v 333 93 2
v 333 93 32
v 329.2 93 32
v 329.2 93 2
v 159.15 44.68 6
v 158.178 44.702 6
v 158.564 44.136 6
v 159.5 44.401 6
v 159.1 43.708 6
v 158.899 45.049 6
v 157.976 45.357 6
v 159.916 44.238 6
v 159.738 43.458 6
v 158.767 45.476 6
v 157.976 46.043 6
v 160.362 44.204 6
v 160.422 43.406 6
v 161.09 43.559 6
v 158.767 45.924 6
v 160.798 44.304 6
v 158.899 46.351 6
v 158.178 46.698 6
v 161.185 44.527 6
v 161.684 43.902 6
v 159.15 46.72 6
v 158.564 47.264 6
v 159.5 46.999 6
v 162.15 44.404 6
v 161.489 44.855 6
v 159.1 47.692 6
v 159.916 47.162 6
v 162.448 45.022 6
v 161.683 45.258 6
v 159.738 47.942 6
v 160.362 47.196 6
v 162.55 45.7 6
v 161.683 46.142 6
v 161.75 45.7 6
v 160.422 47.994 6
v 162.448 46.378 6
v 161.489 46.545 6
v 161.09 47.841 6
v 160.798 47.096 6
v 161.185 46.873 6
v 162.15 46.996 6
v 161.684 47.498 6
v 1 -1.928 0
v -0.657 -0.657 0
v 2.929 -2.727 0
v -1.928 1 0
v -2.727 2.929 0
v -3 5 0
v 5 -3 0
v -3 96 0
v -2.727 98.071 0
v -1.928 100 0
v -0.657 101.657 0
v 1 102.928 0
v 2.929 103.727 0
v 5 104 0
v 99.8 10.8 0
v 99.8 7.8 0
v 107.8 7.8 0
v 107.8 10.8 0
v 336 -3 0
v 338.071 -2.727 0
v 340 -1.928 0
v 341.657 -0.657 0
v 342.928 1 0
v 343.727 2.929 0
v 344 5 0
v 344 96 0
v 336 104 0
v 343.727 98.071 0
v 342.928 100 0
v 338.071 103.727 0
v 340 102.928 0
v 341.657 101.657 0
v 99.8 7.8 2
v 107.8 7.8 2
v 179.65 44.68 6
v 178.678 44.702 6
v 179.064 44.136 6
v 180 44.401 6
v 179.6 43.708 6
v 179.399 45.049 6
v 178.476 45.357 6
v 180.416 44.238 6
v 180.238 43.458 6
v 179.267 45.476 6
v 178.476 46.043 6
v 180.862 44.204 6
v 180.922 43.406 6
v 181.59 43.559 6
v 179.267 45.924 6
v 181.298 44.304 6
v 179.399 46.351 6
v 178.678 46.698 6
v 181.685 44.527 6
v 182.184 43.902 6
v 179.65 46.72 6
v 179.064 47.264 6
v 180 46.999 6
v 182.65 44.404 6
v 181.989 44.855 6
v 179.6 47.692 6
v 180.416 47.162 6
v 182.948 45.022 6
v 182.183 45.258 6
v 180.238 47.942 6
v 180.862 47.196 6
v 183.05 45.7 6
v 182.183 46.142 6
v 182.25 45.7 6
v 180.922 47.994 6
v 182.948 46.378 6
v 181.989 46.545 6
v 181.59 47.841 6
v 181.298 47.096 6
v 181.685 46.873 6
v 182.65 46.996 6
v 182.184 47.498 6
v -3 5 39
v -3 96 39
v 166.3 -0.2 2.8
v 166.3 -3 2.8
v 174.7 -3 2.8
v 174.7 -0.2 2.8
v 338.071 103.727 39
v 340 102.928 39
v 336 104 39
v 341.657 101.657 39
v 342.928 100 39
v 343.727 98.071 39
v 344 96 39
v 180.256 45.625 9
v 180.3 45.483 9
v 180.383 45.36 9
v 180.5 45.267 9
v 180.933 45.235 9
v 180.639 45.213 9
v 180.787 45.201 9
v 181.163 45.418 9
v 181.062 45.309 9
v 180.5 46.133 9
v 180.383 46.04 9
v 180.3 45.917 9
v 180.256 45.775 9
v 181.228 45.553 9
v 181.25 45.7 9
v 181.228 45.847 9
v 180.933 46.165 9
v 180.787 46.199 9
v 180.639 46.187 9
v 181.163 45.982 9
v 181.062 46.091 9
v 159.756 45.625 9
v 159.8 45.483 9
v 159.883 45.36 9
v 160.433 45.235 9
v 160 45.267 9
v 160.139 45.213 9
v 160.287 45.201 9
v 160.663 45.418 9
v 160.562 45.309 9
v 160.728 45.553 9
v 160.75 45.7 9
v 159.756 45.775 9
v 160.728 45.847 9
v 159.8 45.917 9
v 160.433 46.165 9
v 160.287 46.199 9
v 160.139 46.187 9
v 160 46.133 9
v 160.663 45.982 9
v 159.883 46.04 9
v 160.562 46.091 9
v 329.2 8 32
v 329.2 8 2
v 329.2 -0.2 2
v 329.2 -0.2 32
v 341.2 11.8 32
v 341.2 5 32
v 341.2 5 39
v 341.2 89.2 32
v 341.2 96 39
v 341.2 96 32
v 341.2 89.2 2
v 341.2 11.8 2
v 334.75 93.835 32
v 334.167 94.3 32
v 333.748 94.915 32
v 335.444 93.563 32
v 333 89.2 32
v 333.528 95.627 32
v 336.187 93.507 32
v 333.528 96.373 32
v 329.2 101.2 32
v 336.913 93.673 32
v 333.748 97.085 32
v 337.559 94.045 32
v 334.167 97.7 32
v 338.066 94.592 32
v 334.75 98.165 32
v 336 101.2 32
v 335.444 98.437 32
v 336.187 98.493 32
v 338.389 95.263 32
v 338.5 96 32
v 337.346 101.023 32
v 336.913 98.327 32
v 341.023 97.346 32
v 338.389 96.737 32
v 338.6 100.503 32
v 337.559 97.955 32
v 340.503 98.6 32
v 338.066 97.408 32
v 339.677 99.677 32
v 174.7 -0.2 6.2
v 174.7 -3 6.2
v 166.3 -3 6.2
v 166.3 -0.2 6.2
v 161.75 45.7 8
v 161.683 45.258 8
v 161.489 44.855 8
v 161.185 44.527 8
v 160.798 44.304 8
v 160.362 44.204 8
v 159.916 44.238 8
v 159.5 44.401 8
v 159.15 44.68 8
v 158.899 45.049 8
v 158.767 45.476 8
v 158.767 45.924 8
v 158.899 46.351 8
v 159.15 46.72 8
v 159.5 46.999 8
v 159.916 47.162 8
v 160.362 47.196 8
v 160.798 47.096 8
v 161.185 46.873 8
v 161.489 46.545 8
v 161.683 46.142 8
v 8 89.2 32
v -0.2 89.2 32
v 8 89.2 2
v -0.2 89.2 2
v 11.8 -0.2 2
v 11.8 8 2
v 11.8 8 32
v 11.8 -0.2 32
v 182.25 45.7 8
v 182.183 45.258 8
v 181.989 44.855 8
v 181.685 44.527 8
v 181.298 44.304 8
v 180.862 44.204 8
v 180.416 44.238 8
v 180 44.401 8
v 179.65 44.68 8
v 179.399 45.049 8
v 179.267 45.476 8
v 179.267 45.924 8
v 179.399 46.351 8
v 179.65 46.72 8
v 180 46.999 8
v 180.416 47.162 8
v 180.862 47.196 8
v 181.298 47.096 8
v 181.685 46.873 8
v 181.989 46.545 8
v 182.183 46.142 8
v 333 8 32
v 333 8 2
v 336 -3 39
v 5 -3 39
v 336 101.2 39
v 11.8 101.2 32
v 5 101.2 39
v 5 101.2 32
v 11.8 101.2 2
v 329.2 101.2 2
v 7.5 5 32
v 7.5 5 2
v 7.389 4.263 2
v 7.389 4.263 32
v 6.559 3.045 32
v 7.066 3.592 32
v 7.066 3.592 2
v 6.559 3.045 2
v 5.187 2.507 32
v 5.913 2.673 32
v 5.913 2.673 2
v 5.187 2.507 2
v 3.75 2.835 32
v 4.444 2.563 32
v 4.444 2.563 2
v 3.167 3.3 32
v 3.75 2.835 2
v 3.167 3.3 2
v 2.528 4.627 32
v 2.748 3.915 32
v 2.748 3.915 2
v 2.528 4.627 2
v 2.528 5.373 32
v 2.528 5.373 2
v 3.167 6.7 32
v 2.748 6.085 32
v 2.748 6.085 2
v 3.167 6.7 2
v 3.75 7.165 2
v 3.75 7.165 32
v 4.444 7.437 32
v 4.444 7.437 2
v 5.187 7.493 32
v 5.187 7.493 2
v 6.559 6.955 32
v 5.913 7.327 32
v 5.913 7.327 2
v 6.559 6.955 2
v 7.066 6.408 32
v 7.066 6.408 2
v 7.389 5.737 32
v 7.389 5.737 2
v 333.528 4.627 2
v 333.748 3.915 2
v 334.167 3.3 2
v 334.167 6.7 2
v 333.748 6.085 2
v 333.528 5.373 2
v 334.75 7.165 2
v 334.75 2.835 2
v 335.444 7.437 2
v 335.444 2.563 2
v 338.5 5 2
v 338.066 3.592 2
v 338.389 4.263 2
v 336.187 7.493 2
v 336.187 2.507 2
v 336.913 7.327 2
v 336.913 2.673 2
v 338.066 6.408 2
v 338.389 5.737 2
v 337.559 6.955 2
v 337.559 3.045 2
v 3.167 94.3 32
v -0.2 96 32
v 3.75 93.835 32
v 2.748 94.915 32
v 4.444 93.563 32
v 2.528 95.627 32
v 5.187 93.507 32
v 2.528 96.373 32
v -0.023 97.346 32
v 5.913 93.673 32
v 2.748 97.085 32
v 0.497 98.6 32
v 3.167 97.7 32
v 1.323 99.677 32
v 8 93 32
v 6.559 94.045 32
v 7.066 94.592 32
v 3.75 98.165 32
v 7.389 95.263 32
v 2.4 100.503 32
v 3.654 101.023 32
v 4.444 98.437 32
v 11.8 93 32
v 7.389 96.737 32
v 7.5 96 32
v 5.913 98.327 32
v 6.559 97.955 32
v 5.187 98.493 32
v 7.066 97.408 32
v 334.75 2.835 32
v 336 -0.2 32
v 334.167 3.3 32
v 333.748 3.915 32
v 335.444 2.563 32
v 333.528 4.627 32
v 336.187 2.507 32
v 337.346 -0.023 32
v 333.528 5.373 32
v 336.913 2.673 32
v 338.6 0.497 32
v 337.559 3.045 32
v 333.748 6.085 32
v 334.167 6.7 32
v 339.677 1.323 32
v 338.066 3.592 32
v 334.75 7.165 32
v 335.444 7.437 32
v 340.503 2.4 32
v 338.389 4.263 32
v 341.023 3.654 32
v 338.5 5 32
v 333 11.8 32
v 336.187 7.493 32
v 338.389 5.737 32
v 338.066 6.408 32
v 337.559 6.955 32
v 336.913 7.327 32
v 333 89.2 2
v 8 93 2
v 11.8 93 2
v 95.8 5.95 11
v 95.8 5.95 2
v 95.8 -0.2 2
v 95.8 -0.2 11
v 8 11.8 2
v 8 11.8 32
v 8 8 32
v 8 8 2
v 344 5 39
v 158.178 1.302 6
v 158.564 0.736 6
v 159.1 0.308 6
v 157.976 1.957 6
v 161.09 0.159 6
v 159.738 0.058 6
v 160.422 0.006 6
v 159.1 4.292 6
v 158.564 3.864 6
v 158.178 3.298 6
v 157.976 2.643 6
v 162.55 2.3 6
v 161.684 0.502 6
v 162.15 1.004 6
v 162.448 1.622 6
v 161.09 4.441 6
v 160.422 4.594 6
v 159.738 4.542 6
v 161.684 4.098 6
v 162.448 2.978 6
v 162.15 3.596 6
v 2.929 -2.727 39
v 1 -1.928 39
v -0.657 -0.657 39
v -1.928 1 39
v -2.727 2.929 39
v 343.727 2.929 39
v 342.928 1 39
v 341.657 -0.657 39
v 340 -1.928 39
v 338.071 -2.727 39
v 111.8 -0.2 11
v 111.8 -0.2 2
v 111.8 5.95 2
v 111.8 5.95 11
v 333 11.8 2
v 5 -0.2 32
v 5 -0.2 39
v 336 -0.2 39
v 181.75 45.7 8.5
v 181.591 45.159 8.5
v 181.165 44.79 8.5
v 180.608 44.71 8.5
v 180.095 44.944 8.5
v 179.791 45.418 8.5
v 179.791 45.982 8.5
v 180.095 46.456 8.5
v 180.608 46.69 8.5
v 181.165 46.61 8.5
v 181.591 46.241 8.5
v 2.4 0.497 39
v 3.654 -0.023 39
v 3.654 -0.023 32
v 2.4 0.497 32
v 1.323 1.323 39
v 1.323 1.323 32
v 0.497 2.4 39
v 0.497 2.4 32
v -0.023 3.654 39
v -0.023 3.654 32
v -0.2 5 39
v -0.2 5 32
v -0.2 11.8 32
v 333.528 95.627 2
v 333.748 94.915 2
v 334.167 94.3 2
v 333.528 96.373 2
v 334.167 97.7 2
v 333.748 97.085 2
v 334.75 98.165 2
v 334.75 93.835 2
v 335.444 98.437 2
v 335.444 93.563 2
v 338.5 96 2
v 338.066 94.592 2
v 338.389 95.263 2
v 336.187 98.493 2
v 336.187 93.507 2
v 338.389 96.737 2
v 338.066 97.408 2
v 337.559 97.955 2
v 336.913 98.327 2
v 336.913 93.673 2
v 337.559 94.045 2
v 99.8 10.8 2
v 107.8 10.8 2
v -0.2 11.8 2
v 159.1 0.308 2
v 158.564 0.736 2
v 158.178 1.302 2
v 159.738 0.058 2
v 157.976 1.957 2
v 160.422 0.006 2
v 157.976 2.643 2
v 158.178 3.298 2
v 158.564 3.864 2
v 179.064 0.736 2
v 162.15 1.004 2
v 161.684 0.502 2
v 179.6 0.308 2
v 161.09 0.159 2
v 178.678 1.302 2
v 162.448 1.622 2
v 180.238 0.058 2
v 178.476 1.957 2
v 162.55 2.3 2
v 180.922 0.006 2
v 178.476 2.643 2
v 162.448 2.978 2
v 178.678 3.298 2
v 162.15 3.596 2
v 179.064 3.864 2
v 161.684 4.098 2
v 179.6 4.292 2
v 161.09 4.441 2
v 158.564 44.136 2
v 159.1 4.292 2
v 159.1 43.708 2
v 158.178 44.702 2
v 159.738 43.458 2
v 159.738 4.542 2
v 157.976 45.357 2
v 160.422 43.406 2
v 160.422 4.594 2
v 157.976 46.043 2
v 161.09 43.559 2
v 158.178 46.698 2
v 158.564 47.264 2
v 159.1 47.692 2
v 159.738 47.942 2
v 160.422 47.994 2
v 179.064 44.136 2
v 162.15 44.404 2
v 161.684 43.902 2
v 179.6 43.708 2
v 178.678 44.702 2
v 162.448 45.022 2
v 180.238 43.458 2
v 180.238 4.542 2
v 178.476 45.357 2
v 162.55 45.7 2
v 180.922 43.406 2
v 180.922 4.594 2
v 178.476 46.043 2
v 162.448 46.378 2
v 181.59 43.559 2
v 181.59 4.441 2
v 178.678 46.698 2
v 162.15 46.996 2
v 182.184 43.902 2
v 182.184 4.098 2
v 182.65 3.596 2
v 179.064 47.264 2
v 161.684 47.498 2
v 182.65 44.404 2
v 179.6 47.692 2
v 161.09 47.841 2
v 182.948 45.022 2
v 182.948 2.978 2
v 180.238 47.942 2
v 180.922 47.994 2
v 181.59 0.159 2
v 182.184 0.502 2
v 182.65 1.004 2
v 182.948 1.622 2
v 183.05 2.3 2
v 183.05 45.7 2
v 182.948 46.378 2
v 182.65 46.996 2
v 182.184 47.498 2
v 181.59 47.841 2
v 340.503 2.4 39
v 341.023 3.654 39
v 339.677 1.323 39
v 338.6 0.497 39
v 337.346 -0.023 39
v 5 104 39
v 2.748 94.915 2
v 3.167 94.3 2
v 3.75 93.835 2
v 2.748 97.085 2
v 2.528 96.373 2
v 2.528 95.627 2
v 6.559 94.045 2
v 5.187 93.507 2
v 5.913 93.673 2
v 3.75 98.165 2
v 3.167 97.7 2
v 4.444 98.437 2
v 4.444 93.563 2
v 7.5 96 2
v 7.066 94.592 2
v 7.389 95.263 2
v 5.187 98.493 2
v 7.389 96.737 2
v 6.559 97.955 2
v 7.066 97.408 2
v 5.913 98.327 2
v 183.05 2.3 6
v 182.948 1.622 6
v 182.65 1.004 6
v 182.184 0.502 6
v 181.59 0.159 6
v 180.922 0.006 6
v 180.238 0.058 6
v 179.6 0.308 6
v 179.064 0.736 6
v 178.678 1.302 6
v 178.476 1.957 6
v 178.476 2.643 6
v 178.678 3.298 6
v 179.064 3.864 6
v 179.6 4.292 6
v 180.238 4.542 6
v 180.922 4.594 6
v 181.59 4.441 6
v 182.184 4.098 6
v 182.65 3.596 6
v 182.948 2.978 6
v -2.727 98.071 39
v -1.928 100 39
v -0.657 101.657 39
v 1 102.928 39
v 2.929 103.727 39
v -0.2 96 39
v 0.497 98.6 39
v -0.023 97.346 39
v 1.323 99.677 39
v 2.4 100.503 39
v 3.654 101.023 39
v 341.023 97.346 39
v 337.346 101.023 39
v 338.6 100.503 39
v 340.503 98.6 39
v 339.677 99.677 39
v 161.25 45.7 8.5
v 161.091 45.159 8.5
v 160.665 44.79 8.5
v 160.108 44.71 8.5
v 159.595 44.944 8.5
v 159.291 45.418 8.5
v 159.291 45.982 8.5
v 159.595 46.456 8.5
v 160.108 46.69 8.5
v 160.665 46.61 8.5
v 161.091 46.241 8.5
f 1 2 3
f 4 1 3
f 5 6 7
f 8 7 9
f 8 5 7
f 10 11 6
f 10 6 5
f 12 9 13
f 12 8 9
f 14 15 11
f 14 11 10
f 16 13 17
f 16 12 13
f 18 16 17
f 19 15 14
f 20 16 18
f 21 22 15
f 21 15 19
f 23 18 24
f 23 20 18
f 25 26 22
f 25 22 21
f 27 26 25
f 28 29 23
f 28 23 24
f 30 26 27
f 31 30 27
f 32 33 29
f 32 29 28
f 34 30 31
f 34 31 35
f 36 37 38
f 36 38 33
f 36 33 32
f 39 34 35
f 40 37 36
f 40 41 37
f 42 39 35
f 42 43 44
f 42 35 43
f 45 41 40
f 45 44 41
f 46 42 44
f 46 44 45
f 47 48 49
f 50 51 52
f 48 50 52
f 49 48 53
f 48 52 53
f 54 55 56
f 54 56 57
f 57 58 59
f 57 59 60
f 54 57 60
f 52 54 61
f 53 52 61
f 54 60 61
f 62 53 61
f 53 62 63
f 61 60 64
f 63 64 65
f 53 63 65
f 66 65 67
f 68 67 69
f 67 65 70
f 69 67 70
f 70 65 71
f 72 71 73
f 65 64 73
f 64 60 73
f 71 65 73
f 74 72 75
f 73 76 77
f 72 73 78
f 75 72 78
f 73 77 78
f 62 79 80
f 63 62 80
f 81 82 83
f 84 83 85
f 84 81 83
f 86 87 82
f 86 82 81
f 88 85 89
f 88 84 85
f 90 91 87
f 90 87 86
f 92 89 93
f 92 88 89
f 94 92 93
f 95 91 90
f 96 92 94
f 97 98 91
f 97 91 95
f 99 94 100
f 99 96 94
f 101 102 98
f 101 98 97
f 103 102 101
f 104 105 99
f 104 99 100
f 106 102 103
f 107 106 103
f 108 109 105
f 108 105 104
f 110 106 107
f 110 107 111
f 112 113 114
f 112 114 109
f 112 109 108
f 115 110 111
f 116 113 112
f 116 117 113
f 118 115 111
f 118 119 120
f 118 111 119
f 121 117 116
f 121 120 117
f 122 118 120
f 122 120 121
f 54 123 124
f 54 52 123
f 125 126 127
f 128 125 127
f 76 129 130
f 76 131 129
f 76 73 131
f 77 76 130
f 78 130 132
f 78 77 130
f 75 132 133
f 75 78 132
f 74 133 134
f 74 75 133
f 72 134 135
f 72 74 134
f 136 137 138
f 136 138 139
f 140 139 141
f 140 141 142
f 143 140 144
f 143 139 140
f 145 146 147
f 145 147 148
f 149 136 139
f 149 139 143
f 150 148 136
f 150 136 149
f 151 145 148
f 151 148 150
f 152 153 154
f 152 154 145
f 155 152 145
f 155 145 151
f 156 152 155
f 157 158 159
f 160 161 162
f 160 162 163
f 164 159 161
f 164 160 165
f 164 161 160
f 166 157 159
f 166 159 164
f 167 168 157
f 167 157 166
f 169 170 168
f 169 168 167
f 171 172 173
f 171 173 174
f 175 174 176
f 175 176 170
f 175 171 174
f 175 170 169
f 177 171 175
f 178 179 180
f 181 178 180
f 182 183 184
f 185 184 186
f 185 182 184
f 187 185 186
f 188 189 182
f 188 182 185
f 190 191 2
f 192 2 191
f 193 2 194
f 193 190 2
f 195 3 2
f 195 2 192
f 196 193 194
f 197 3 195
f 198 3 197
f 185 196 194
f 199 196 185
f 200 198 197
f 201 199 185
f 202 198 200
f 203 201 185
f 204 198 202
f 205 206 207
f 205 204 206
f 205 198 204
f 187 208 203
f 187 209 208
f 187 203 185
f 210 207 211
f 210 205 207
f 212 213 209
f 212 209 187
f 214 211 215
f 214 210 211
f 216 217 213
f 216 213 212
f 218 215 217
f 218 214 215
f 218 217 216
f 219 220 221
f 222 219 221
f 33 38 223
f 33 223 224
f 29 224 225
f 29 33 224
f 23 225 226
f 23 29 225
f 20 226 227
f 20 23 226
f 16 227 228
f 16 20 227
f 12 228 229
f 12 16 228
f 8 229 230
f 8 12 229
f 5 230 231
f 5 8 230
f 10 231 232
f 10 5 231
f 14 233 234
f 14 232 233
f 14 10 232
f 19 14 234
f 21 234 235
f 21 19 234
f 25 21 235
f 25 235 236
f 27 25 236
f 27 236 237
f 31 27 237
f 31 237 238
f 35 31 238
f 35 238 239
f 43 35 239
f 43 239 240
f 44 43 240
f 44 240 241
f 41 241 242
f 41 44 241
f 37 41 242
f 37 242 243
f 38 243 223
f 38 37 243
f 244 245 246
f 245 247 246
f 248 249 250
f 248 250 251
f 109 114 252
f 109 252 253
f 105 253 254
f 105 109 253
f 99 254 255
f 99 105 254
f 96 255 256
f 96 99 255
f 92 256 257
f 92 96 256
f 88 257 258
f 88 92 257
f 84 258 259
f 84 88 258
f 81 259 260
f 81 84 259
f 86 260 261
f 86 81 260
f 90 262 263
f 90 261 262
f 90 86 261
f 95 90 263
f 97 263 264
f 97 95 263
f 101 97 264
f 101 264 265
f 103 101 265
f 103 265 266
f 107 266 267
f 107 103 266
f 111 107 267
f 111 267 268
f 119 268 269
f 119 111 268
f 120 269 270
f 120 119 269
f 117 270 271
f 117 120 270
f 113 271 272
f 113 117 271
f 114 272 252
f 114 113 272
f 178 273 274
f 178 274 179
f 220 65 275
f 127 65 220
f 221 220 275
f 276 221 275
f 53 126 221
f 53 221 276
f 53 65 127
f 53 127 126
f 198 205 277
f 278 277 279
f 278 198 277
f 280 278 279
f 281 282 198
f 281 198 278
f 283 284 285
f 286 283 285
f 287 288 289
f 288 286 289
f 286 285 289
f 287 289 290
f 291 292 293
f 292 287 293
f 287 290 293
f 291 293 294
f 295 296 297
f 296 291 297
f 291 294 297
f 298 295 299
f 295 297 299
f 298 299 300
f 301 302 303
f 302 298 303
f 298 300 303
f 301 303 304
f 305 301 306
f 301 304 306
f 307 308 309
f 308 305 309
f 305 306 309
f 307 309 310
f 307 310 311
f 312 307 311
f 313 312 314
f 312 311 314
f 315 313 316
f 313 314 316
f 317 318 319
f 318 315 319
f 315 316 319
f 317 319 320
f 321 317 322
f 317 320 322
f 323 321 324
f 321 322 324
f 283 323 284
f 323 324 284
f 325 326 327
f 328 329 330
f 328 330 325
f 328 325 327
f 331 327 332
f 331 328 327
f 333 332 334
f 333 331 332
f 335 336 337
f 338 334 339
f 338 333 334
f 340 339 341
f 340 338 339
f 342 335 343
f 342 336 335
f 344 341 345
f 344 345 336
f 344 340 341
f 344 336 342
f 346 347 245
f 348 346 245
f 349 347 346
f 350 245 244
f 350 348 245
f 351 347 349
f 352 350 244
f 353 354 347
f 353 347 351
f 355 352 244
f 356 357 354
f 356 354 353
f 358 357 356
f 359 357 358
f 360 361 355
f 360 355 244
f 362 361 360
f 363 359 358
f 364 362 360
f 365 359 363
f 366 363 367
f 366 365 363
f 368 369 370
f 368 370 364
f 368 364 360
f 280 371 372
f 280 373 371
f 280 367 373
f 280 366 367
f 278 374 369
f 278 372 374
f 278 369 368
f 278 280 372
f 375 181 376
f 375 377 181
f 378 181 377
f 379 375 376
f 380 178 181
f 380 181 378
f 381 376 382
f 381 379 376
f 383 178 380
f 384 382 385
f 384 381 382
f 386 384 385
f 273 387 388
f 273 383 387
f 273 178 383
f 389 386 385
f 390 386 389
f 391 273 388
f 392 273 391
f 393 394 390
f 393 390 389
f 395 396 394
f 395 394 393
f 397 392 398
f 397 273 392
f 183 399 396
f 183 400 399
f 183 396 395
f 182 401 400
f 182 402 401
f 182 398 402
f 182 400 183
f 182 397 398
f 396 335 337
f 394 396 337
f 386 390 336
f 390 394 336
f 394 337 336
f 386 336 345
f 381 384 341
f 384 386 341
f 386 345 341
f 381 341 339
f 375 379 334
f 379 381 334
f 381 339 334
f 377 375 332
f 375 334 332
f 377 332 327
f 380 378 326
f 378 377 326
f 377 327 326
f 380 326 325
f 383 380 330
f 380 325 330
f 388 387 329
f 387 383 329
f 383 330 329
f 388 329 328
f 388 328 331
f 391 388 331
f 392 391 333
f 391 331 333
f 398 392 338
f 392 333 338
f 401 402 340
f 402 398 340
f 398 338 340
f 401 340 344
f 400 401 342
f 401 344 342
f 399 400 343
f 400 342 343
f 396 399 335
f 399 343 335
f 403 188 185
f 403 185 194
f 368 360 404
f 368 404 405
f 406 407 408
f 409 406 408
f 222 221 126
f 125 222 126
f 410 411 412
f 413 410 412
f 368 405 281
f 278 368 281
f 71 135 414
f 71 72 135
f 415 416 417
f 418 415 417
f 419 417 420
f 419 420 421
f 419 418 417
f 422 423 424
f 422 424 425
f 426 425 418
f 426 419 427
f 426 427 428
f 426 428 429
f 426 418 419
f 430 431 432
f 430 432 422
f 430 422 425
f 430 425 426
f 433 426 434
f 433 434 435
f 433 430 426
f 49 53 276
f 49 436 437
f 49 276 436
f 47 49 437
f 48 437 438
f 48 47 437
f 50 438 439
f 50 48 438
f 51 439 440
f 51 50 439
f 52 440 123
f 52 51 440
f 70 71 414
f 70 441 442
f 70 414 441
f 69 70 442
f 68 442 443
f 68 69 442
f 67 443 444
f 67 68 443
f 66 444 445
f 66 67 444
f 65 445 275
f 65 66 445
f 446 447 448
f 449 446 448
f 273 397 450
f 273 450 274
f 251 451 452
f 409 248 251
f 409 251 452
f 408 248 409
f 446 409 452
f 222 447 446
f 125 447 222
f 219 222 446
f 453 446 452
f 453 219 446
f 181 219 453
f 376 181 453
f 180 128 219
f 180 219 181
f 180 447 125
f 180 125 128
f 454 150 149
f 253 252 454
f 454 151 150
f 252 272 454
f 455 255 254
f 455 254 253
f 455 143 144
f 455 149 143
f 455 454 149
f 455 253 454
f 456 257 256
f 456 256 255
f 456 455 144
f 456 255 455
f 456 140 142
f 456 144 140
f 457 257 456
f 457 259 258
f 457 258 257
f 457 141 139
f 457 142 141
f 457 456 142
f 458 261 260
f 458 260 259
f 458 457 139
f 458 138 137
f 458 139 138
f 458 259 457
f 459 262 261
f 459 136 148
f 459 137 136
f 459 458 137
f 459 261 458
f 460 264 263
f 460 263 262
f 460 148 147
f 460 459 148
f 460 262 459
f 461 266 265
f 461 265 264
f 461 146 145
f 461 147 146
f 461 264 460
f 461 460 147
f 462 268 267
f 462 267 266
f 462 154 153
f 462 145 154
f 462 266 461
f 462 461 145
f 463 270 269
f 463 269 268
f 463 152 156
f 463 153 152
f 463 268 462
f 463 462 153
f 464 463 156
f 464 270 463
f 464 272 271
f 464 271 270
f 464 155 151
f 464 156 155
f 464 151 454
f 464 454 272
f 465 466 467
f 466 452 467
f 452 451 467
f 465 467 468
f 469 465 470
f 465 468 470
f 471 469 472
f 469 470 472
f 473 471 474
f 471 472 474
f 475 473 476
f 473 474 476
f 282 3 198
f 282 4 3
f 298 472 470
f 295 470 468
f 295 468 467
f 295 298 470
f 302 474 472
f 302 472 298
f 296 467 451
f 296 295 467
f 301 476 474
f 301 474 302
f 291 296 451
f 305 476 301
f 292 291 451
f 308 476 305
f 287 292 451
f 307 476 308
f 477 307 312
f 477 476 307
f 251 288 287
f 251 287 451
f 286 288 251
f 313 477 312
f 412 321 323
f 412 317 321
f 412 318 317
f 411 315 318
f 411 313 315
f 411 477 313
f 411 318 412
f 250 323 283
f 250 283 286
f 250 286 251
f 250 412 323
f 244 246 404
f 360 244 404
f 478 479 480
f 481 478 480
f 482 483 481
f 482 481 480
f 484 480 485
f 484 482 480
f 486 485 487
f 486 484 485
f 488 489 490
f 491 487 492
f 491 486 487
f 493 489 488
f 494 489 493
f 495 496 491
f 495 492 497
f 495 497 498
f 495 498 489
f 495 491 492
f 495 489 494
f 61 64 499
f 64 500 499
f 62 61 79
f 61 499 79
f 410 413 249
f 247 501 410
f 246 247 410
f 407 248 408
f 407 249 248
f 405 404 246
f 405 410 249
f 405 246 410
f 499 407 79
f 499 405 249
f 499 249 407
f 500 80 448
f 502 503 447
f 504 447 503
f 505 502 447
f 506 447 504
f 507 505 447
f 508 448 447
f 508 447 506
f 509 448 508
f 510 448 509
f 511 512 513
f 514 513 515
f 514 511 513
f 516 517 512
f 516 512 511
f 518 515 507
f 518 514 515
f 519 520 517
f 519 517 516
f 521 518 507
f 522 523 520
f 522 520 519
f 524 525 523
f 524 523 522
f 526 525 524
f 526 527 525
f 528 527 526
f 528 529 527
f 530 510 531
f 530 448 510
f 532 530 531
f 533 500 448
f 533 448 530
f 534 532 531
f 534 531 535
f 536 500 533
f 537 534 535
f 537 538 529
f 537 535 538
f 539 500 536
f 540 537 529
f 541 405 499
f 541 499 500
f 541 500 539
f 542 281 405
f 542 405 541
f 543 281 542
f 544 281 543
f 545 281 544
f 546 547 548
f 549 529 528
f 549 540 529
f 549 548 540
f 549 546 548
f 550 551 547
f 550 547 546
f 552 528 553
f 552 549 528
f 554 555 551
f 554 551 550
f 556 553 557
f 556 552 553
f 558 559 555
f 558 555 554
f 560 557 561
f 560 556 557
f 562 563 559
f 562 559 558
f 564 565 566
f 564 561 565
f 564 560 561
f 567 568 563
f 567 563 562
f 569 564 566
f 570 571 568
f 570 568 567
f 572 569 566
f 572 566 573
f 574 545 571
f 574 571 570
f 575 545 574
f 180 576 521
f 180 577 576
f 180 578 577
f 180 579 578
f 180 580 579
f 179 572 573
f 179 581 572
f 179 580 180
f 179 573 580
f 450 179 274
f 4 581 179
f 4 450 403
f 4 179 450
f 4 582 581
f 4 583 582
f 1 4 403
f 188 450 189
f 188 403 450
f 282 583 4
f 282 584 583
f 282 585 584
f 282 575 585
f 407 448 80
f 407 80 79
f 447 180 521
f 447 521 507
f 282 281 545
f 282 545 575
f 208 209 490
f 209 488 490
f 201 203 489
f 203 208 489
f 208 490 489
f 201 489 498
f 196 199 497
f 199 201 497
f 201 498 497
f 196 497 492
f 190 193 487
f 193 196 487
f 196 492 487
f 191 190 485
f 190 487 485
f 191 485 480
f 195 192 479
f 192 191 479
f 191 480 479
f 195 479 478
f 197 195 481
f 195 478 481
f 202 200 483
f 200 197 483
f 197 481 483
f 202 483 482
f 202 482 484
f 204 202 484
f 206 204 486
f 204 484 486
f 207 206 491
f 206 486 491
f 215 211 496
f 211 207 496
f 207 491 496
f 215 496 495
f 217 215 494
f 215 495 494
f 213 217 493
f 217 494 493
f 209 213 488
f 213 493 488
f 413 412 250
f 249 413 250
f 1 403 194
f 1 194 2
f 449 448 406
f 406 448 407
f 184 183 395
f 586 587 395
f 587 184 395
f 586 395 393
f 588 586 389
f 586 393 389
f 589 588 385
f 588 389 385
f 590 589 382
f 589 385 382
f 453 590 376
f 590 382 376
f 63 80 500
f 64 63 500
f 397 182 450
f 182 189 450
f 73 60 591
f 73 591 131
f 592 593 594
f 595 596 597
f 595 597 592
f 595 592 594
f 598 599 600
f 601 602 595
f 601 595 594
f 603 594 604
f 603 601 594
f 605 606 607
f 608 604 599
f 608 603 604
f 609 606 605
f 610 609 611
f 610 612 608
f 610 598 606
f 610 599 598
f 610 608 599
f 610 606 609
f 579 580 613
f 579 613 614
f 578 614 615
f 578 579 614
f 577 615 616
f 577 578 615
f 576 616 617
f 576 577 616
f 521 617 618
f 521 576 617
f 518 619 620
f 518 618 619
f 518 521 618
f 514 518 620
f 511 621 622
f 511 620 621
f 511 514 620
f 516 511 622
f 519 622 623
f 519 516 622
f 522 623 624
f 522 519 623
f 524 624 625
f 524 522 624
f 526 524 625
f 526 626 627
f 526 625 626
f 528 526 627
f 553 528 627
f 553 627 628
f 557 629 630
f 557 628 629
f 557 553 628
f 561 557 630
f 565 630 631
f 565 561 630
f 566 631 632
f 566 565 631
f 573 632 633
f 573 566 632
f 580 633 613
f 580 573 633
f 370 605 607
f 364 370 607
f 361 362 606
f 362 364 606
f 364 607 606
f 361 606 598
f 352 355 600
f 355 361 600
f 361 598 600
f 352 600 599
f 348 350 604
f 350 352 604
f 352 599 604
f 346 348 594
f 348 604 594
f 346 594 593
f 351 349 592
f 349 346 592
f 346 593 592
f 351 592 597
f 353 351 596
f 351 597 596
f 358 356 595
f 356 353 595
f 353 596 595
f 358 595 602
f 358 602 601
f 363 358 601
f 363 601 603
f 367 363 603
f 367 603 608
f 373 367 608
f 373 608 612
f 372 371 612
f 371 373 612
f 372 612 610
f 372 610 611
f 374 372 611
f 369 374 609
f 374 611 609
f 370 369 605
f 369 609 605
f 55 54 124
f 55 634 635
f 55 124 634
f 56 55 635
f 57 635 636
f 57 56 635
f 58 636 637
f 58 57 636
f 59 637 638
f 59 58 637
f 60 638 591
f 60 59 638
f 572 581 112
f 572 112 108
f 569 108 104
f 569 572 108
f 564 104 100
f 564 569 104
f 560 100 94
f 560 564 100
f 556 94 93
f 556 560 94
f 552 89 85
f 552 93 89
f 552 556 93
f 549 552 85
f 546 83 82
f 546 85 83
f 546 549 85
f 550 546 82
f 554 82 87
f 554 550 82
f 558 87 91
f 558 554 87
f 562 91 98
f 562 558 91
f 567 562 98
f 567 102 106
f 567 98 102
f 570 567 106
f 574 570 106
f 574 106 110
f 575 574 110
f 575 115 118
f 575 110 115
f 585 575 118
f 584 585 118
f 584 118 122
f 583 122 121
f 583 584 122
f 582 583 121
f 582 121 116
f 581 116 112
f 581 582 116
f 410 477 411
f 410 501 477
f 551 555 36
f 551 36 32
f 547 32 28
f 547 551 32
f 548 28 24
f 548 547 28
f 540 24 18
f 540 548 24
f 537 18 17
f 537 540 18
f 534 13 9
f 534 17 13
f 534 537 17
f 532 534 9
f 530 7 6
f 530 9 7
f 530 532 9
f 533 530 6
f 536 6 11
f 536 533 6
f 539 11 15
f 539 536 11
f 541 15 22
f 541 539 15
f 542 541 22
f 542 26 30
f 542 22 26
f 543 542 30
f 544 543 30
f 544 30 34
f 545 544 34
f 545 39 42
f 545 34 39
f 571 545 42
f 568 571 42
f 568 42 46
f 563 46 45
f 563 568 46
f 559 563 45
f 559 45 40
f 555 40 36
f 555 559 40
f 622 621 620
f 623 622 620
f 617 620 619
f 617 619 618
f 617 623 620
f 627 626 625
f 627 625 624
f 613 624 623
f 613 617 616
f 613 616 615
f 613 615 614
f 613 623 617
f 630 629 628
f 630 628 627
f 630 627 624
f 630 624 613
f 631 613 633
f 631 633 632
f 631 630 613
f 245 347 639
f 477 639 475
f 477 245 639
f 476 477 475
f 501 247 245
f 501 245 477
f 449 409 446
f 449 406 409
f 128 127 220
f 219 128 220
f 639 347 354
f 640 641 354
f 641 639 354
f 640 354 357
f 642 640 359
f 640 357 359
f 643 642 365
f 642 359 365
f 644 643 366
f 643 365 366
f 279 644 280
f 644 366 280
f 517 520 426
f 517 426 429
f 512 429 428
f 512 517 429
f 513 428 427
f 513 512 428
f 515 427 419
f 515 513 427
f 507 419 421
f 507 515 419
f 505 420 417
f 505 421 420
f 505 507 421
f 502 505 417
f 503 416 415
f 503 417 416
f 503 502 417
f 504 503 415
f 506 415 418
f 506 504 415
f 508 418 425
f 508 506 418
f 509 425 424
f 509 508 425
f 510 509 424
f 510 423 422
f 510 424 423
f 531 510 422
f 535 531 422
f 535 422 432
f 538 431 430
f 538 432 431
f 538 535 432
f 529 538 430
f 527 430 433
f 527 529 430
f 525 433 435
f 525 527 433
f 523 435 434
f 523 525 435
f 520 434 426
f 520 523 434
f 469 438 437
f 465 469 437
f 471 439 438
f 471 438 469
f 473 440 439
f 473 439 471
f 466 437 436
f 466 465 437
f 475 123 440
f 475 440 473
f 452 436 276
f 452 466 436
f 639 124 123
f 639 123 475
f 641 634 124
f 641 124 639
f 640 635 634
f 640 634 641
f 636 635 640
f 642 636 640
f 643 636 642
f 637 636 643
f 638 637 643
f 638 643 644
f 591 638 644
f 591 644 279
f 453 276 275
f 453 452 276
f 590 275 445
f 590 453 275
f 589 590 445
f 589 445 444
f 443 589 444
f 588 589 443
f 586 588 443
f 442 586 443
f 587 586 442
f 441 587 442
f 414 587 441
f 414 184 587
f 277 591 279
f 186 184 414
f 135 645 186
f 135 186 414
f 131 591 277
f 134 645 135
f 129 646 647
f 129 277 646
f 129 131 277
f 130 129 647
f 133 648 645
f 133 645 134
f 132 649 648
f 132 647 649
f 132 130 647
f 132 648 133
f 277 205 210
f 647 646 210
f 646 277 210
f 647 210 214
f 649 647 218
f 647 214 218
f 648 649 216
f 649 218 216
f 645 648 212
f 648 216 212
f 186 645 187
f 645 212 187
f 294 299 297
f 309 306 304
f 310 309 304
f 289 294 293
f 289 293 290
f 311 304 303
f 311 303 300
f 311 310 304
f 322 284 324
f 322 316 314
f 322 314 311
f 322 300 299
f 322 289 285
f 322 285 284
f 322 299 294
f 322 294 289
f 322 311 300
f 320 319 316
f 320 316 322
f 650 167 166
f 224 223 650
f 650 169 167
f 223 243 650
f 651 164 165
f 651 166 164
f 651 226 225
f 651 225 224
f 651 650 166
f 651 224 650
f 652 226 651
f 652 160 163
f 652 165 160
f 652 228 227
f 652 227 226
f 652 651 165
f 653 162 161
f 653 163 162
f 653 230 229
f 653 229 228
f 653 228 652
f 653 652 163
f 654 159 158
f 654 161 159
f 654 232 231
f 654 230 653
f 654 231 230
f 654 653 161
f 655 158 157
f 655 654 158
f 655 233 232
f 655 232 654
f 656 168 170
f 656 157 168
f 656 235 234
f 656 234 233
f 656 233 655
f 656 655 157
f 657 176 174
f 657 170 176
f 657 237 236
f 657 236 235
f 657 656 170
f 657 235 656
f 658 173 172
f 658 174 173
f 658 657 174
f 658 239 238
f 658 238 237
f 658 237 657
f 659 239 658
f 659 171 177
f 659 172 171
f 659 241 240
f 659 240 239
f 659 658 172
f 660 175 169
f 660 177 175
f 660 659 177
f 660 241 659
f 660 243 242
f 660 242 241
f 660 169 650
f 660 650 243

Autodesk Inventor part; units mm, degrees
ref_plane "YZ Plane" through (0, 0, 0) normal (1, 0, 0) x (0, 1, 0)
ref_plane "XZ Plane" through (0, 0, 0) normal (0, 1, 0) x (-1, 0, 0)
ref_plane "XY Plane" through (0, 0, 0) normal (0, 0, 1) x (1, 0, 0)
sketch "Sketch1" plane through (0, 0, 0) normal (0, 0, 1) x (1, 0, 0)
  line L0 (5, 0) -> (336, 0)
  line L1 (341, 5) -> (341, 96)
  line L2 (336, 101) -> (5, 101)
  line L3 (0, 96) -> (0, 5)
  arc A0 (5, 101) -> (0, 96) centre (5, 96) ccw
  arc A1 (0, 5) -> (5, 0) centre (5, 5) ccw
  arc A2 (341, 96) -> (336, 101) centre (336, 96) ccw
  arc A3 (336, 0) -> (341, 5) centre (336, 5) ccw
  line L4 (5, 101.2) -> (336, 101.2)
  arc A4 (341.2, 96) -> (336, 101.2) centre (336, 96) ccw
  line L5 (341.2, 96) -> (341.2, 5)
  arc A5 (336, -0.2) -> (341.2, 5) centre (336, 5) ccw
  line L6 (336, -0.2) -> (5, -0.2)
  arc A6 (-0.2, 5) -> (5, -0.2) centre (5, 5) ccw
  line L7 (-0.2, 5) -> (-0.2, 96)
  arc A7 (5, 101.2) -> (-0.2, 96) centre (5, 96) ccw
  line L8 (5, 104) -> (336, 104)
  arc A8 (344, 96) -> (336, 104) centre (336, 96) ccw
  line L9 (344, 96) -> (344, 5)
  arc A9 (336, -3) -> (344, 5) centre (336, 5) ccw
  line L10 (336, -3) -> (5, -3)
  arc A10 (-3, 5) -> (5, -3) centre (5, 5) ccw
  line L11 (-3, 5) -> (-3, 96)
  arc A11 (5, 104) -> (-3, 96) centre (5, 96) ccw
  point P0 (0, 0)
  point P1 (341, 101)
  point P2 (0, 101)
  dimension "d0" = 341
  dimension "d1" = 101
  dimension "d2" = 5
  dimension "d3" = 0.2
  dimension "d4" = 3
extrude "Extrusion1" add sketch "Sketch1" along normal blind 2 contours A1 L3 A0 L2 A2 L1 A3 L0 | L4 A4 L5 A5 L6 A6 L7 A7 | L8 A8 L9 A9 L10 A10 L11 A11
sketch "Sketch2" plane through (0, 0, 2) normal (0, 0, 1) x (1, 0, 0)
  line L0 (5, 104) -> (336, 104)
  line L1 (344, 96) -> (344, 5)
  line L2 (336, -3) -> (5, -3)
  line L3 (-3, 5) -> (-3, 96)
  line L4 (344, 5) -> (344, 96) projected
  line L5 (5, -3) -> (336, -3) projected
  arc A0 (5, 104) -> (-3, 96) centre (5, 96) ccw
  arc A1 (-3, 5) -> (5, -3) centre (5, 5) ccw
  arc A2 (336, -3) -> (344, 5) centre (336, 5) ccw
  arc A3 (344, 96) -> (336, 104) centre (336, 96) ccw
  line L6 (336, 101.2) -> (5, 101.2)
  arc A4 (5, 101.2) -> (-0.2, 96) centre (5, 96) ccw
  line L7 (-0.2, 96) -> (-0.2, 5)
  arc A5 (-0.2, 5) -> (5, -0.2) centre (5, 5) ccw
  line L8 (5, -0.2) -> (336, -0.2)
  arc A6 (336, -0.2) -> (341.2, 5) centre (336, 5) ccw
  line L9 (341.2, 5) -> (341.2, 96)
  arc A7 (341.2, 96) -> (336, 101.2) centre (336, 96) ccw
  circle A8 centre (5, 96) radius 2.5
  line L10 (9, 92) -> (332, 92)
  line L11 (332, 92) -> (332, 9)
  line L12 (332, 9) -> (9, 9)
  line L13 (9, 9) -> (9, 92)
  line L14 (-0.2, 89.2) -> (8, 89.2)
  line L15 (8, 89.2) -> (8, 93)
  line L16 (8, 93) -> (11.8, 93)
  line L17 (11.8, 93) -> (11.8, 101.2)
  line L18 (9, 9) -> (332, 92)
  line L19 (170.5, 64.427) -> (170.5, 38.8649)
  line L20 (118.7328, 50.5) -> (212.1169, 50.5)
  circle A9 centre (336, 96) radius 2.5
  line L21 (341.2, 89.2) -> (333, 89.2)
  line L22 (333, 89.2) -> (333, 93)
  line L23 (333, 93) -> (329.2, 93)
  line L24 (329.2, 93) -> (329.2, 101.2)
  circle A10 centre (5, 5) radius 2.5
  line L25 (-0.2, 11.8) -> (8, 11.8)
  line L26 (8, 11.8) -> (8, 8)
  line L27 (8, 8) -> (11.8, 8)
  line L28 (11.8, 8) -> (11.8, -0.2)
  line L29 (329.2, 8) -> (329.2, -0.2)
  line L30 (333, 8) -> (329.2, 8)
  line L31 (333, 11.8) -> (333, 8)
  line L32 (341.2, 11.8) -> (333, 11.8)
  circle A11 centre (336, 5) radius 2.5
  point P0 (0, 0)
  dimension "d7" = 0
  dimension "d8" = 0
  dimension "d9" = 8
  dimension "d10" = 2.8
  dimension "d11" = 5
  dimension "d12" = 5.2
  dimension "d13" = 5.2
  dimension "d19" = 9.2
  dimension "d20" = 9.2
  dimension "d21" = 9.2
  dimension "d22" = 9.2
  dimension "d23" = 1
  dimension "d24" = 1
  dimension "d25" = 12
  dimension "d26" = 12
extrude "Extrusion2" add sketch "Sketch2" along normal blind 30 contours L0 A3 L1 A2 L2 A1 L3 A0 | A7 L9 L21 L22 L23 L24 L6 | L17 L16 L15 L14 L7 A4 L6 | L9 A6 L8 L29 L30 L31 L32 | L25 L26 L27 L28 L8 A5 L7
sketch "Sketch3" plane through (0, 0, 32) normal (0, 0, 1) x (1, 0, 0)
  line L0 (5, 104) -> (336, 104)
  line L1 (344, 96) -> (344, 5)
  line L2 (336, -3) -> (5, -3)
  line L3 (-3, 5) -> (-3, 96)
  arc A0 (5, 104) -> (-3, 96) centre (5, 96) ccw
  arc A1 (-3, 5) -> (5, -3) centre (5, 5) ccw
  arc A2 (336, -3) -> (344, 5) centre (336, 5) ccw
  arc A3 (344, 96) -> (336, 104) centre (336, 96) ccw
  line L4 (336, 101.2) -> (5, 101.2)
  arc A4 (5, 101.2) -> (-0.2, 96) centre (5, 96) ccw
  line L5 (-0.2, 96) -> (-0.2, 5)
  arc A5 (-0.2, 5) -> (5, -0.2) centre (5, 5) ccw
  line L6 (5, -0.2) -> (336, -0.2)
  arc A6 (336, -0.2) -> (341.2, 5) centre (336, 5) ccw
  line L7 (341.2, 5) -> (341.2, 96)
  arc A7 (341.2, 96) -> (336, 101.2) centre (336, 96) ccw
  point P0 (0, 0)
  dimension "d29" = 8
  dimension "d30" = 2.8
extrude "Extrusion3" add sketch "Sketch3" along normal blind 7
sketch "Sketch4" plane through (0, 0, 2) normal (0, 0, 1) x (1, 0, 0)
  line L0 (336, -0.2) -> (5, -0.2) projected
  line L1 (157.75, -0.2) -> (183.25, -0.2)
  line L2 (183.25, -0.2) -> (183.25, 48.2)
  line L3 (183.25, 48.2) -> (157.75, 48.2)
  line L4 (157.75, 48.2) -> (157.75, -0.2)
  line L5 (-0.2, 5) -> (-0.2, 96) projected
  circle A0 centre (160.25, 45.7) radius 2.3
  circle A1 centre (180.75, 45.7) radius 2.3
  circle A2 centre (160.25, 2.3) radius 2.3
  circle A3 centre (180.75, 2.3) radius 2.3
  point P0 (0, 0)
  dimension "d33" = 25.5
  dimension "d34" = 48.4
  dimension "d35" = 157.95
  dimension "d36" = 4.6
  dimension "d37" = 4.6
  dimension "d38" = 4.6
  dimension "d39" = 4.6
  dimension "d40" = 2.5
  dimension "d41" = 2.5
  dimension "d42" = 2.5
  dimension "d43" = 2.5
  dimension "d44" = 2.5
  dimension "d45" = 2.5
  dimension "d46" = 2.5
  dimension "d47" = 2.5
extrude "Extrusion4" add sketch "Sketch4" along normal blind 4 contours A0 | A1 | A2 | A3
sketch "Sketch5" plane through (160.25, 2.3, 6) normal (0, 0, 1) x (1, 0, 0)
  circle A0 centre (0, 43.4) radius 2.3 projected
  circle A1 centre (0, 43.4) radius 1.5
  circle A2 centre (20.5, 43.4) radius 2.3 projected
  circle A3 centre (20.5, 43.4) radius 1.5
  circle A4 centre (0, 0) radius 2.3 projected
  circle A5 centre (0, 0) radius 1.5
  circle A6 centre (20.5, 0) radius 2.3 projected
  circle A7 centre (20.5, 0) radius 1.5
  point P0 (-160.25, -2.3)
  dimension "d50" = 3
  dimension "d51" = 3
  dimension "d52" = 3
  dimension "d53" = 3
extrude "Extrusion5" add sketch "Sketch5" along normal blind 3 contours A1 | A3
chamfer "Chamfer1" distance 1 angle 45 2 edges at (158.75, 45.7, 9) (179.25, 45.7, 9)
sketch "Sketch6" plane through (5, -3, 0) normal (0, -1, 0) x (1, 0, 0)
  line L0 (161.3, 2.8) -> (169.7, 2.8)
  line L1 (169.7, 2.8) -> (169.7, 6.2)
  line L2 (169.7, 6.2) -> (161.3, 6.2)
  line L3 (161.3, 6.2) -> (161.3, 2.8)
  line L4 (6.8, 2) -> (324.2, 2) projected
  line L5 (0, 0) -> (0, 39) projected
  point P0 (-5, 0)
  dimension "d59" = 8.4
  dimension "d60" = 3.4
  dimension "d61" = 4.2
  dimension "d62" = 161.3
extrude "Extrusion6" cut sketch "Sketch6" against normal blind 3
sketch "Sketch7" plane through (0, 0, 2) normal (0, 0, 1) x (1, 0, 0)
  line L0 (99.8, 7.8) -> (107.8, 7.8)
  line L1 (107.8, 7.8) -> (107.8, 10.8)
  line L2 (107.8, 10.8) -> (99.8, 10.8)
  line L3 (99.8, 10.8) -> (99.8, 7.8)
  line L4 (336, -0.2) -> (5, -0.2) projected
  line L5 (-0.2, 5) -> (-0.2, 96) projected
  point P0 (0, 0)
  dimension "d65" = 8
  dimension "d66" = 3
  dimension "d67" = 8
  dimension "d68" = 100
extrude "Extrusion7" cut sketch "Sketch7" against normal blind 3
sketch "Sketch8" plane through (0, 0, 2) normal (0, 0, 1) x (1, 0, 0)
  line L0 (11.8, -0.2) -> (329.2, -0.2) projected
  line L1 (95.8, -0.2) -> (111.8, -0.2)
  line L2 (111.8, -0.2) -> (111.8, 5.95)
  line L3 (111.8, 5.95) -> (95.8, 5.95)
  line L4 (95.8, 5.95) -> (95.8, -0.2)
  line L5 (107.8, 7.8) -> (99.8, 7.8) projected
  line L6 (99.8, 7.8) -> (99.8, 10.8) projected
  point P0 (0, 0)
  dimension "d71" = 16
  dimension "d72" = 1.85
  dimension "d73" = 4
extrude "Extrusion8" add sketch "Sketch8" along normal blind 9
properties part number "Case Full"
